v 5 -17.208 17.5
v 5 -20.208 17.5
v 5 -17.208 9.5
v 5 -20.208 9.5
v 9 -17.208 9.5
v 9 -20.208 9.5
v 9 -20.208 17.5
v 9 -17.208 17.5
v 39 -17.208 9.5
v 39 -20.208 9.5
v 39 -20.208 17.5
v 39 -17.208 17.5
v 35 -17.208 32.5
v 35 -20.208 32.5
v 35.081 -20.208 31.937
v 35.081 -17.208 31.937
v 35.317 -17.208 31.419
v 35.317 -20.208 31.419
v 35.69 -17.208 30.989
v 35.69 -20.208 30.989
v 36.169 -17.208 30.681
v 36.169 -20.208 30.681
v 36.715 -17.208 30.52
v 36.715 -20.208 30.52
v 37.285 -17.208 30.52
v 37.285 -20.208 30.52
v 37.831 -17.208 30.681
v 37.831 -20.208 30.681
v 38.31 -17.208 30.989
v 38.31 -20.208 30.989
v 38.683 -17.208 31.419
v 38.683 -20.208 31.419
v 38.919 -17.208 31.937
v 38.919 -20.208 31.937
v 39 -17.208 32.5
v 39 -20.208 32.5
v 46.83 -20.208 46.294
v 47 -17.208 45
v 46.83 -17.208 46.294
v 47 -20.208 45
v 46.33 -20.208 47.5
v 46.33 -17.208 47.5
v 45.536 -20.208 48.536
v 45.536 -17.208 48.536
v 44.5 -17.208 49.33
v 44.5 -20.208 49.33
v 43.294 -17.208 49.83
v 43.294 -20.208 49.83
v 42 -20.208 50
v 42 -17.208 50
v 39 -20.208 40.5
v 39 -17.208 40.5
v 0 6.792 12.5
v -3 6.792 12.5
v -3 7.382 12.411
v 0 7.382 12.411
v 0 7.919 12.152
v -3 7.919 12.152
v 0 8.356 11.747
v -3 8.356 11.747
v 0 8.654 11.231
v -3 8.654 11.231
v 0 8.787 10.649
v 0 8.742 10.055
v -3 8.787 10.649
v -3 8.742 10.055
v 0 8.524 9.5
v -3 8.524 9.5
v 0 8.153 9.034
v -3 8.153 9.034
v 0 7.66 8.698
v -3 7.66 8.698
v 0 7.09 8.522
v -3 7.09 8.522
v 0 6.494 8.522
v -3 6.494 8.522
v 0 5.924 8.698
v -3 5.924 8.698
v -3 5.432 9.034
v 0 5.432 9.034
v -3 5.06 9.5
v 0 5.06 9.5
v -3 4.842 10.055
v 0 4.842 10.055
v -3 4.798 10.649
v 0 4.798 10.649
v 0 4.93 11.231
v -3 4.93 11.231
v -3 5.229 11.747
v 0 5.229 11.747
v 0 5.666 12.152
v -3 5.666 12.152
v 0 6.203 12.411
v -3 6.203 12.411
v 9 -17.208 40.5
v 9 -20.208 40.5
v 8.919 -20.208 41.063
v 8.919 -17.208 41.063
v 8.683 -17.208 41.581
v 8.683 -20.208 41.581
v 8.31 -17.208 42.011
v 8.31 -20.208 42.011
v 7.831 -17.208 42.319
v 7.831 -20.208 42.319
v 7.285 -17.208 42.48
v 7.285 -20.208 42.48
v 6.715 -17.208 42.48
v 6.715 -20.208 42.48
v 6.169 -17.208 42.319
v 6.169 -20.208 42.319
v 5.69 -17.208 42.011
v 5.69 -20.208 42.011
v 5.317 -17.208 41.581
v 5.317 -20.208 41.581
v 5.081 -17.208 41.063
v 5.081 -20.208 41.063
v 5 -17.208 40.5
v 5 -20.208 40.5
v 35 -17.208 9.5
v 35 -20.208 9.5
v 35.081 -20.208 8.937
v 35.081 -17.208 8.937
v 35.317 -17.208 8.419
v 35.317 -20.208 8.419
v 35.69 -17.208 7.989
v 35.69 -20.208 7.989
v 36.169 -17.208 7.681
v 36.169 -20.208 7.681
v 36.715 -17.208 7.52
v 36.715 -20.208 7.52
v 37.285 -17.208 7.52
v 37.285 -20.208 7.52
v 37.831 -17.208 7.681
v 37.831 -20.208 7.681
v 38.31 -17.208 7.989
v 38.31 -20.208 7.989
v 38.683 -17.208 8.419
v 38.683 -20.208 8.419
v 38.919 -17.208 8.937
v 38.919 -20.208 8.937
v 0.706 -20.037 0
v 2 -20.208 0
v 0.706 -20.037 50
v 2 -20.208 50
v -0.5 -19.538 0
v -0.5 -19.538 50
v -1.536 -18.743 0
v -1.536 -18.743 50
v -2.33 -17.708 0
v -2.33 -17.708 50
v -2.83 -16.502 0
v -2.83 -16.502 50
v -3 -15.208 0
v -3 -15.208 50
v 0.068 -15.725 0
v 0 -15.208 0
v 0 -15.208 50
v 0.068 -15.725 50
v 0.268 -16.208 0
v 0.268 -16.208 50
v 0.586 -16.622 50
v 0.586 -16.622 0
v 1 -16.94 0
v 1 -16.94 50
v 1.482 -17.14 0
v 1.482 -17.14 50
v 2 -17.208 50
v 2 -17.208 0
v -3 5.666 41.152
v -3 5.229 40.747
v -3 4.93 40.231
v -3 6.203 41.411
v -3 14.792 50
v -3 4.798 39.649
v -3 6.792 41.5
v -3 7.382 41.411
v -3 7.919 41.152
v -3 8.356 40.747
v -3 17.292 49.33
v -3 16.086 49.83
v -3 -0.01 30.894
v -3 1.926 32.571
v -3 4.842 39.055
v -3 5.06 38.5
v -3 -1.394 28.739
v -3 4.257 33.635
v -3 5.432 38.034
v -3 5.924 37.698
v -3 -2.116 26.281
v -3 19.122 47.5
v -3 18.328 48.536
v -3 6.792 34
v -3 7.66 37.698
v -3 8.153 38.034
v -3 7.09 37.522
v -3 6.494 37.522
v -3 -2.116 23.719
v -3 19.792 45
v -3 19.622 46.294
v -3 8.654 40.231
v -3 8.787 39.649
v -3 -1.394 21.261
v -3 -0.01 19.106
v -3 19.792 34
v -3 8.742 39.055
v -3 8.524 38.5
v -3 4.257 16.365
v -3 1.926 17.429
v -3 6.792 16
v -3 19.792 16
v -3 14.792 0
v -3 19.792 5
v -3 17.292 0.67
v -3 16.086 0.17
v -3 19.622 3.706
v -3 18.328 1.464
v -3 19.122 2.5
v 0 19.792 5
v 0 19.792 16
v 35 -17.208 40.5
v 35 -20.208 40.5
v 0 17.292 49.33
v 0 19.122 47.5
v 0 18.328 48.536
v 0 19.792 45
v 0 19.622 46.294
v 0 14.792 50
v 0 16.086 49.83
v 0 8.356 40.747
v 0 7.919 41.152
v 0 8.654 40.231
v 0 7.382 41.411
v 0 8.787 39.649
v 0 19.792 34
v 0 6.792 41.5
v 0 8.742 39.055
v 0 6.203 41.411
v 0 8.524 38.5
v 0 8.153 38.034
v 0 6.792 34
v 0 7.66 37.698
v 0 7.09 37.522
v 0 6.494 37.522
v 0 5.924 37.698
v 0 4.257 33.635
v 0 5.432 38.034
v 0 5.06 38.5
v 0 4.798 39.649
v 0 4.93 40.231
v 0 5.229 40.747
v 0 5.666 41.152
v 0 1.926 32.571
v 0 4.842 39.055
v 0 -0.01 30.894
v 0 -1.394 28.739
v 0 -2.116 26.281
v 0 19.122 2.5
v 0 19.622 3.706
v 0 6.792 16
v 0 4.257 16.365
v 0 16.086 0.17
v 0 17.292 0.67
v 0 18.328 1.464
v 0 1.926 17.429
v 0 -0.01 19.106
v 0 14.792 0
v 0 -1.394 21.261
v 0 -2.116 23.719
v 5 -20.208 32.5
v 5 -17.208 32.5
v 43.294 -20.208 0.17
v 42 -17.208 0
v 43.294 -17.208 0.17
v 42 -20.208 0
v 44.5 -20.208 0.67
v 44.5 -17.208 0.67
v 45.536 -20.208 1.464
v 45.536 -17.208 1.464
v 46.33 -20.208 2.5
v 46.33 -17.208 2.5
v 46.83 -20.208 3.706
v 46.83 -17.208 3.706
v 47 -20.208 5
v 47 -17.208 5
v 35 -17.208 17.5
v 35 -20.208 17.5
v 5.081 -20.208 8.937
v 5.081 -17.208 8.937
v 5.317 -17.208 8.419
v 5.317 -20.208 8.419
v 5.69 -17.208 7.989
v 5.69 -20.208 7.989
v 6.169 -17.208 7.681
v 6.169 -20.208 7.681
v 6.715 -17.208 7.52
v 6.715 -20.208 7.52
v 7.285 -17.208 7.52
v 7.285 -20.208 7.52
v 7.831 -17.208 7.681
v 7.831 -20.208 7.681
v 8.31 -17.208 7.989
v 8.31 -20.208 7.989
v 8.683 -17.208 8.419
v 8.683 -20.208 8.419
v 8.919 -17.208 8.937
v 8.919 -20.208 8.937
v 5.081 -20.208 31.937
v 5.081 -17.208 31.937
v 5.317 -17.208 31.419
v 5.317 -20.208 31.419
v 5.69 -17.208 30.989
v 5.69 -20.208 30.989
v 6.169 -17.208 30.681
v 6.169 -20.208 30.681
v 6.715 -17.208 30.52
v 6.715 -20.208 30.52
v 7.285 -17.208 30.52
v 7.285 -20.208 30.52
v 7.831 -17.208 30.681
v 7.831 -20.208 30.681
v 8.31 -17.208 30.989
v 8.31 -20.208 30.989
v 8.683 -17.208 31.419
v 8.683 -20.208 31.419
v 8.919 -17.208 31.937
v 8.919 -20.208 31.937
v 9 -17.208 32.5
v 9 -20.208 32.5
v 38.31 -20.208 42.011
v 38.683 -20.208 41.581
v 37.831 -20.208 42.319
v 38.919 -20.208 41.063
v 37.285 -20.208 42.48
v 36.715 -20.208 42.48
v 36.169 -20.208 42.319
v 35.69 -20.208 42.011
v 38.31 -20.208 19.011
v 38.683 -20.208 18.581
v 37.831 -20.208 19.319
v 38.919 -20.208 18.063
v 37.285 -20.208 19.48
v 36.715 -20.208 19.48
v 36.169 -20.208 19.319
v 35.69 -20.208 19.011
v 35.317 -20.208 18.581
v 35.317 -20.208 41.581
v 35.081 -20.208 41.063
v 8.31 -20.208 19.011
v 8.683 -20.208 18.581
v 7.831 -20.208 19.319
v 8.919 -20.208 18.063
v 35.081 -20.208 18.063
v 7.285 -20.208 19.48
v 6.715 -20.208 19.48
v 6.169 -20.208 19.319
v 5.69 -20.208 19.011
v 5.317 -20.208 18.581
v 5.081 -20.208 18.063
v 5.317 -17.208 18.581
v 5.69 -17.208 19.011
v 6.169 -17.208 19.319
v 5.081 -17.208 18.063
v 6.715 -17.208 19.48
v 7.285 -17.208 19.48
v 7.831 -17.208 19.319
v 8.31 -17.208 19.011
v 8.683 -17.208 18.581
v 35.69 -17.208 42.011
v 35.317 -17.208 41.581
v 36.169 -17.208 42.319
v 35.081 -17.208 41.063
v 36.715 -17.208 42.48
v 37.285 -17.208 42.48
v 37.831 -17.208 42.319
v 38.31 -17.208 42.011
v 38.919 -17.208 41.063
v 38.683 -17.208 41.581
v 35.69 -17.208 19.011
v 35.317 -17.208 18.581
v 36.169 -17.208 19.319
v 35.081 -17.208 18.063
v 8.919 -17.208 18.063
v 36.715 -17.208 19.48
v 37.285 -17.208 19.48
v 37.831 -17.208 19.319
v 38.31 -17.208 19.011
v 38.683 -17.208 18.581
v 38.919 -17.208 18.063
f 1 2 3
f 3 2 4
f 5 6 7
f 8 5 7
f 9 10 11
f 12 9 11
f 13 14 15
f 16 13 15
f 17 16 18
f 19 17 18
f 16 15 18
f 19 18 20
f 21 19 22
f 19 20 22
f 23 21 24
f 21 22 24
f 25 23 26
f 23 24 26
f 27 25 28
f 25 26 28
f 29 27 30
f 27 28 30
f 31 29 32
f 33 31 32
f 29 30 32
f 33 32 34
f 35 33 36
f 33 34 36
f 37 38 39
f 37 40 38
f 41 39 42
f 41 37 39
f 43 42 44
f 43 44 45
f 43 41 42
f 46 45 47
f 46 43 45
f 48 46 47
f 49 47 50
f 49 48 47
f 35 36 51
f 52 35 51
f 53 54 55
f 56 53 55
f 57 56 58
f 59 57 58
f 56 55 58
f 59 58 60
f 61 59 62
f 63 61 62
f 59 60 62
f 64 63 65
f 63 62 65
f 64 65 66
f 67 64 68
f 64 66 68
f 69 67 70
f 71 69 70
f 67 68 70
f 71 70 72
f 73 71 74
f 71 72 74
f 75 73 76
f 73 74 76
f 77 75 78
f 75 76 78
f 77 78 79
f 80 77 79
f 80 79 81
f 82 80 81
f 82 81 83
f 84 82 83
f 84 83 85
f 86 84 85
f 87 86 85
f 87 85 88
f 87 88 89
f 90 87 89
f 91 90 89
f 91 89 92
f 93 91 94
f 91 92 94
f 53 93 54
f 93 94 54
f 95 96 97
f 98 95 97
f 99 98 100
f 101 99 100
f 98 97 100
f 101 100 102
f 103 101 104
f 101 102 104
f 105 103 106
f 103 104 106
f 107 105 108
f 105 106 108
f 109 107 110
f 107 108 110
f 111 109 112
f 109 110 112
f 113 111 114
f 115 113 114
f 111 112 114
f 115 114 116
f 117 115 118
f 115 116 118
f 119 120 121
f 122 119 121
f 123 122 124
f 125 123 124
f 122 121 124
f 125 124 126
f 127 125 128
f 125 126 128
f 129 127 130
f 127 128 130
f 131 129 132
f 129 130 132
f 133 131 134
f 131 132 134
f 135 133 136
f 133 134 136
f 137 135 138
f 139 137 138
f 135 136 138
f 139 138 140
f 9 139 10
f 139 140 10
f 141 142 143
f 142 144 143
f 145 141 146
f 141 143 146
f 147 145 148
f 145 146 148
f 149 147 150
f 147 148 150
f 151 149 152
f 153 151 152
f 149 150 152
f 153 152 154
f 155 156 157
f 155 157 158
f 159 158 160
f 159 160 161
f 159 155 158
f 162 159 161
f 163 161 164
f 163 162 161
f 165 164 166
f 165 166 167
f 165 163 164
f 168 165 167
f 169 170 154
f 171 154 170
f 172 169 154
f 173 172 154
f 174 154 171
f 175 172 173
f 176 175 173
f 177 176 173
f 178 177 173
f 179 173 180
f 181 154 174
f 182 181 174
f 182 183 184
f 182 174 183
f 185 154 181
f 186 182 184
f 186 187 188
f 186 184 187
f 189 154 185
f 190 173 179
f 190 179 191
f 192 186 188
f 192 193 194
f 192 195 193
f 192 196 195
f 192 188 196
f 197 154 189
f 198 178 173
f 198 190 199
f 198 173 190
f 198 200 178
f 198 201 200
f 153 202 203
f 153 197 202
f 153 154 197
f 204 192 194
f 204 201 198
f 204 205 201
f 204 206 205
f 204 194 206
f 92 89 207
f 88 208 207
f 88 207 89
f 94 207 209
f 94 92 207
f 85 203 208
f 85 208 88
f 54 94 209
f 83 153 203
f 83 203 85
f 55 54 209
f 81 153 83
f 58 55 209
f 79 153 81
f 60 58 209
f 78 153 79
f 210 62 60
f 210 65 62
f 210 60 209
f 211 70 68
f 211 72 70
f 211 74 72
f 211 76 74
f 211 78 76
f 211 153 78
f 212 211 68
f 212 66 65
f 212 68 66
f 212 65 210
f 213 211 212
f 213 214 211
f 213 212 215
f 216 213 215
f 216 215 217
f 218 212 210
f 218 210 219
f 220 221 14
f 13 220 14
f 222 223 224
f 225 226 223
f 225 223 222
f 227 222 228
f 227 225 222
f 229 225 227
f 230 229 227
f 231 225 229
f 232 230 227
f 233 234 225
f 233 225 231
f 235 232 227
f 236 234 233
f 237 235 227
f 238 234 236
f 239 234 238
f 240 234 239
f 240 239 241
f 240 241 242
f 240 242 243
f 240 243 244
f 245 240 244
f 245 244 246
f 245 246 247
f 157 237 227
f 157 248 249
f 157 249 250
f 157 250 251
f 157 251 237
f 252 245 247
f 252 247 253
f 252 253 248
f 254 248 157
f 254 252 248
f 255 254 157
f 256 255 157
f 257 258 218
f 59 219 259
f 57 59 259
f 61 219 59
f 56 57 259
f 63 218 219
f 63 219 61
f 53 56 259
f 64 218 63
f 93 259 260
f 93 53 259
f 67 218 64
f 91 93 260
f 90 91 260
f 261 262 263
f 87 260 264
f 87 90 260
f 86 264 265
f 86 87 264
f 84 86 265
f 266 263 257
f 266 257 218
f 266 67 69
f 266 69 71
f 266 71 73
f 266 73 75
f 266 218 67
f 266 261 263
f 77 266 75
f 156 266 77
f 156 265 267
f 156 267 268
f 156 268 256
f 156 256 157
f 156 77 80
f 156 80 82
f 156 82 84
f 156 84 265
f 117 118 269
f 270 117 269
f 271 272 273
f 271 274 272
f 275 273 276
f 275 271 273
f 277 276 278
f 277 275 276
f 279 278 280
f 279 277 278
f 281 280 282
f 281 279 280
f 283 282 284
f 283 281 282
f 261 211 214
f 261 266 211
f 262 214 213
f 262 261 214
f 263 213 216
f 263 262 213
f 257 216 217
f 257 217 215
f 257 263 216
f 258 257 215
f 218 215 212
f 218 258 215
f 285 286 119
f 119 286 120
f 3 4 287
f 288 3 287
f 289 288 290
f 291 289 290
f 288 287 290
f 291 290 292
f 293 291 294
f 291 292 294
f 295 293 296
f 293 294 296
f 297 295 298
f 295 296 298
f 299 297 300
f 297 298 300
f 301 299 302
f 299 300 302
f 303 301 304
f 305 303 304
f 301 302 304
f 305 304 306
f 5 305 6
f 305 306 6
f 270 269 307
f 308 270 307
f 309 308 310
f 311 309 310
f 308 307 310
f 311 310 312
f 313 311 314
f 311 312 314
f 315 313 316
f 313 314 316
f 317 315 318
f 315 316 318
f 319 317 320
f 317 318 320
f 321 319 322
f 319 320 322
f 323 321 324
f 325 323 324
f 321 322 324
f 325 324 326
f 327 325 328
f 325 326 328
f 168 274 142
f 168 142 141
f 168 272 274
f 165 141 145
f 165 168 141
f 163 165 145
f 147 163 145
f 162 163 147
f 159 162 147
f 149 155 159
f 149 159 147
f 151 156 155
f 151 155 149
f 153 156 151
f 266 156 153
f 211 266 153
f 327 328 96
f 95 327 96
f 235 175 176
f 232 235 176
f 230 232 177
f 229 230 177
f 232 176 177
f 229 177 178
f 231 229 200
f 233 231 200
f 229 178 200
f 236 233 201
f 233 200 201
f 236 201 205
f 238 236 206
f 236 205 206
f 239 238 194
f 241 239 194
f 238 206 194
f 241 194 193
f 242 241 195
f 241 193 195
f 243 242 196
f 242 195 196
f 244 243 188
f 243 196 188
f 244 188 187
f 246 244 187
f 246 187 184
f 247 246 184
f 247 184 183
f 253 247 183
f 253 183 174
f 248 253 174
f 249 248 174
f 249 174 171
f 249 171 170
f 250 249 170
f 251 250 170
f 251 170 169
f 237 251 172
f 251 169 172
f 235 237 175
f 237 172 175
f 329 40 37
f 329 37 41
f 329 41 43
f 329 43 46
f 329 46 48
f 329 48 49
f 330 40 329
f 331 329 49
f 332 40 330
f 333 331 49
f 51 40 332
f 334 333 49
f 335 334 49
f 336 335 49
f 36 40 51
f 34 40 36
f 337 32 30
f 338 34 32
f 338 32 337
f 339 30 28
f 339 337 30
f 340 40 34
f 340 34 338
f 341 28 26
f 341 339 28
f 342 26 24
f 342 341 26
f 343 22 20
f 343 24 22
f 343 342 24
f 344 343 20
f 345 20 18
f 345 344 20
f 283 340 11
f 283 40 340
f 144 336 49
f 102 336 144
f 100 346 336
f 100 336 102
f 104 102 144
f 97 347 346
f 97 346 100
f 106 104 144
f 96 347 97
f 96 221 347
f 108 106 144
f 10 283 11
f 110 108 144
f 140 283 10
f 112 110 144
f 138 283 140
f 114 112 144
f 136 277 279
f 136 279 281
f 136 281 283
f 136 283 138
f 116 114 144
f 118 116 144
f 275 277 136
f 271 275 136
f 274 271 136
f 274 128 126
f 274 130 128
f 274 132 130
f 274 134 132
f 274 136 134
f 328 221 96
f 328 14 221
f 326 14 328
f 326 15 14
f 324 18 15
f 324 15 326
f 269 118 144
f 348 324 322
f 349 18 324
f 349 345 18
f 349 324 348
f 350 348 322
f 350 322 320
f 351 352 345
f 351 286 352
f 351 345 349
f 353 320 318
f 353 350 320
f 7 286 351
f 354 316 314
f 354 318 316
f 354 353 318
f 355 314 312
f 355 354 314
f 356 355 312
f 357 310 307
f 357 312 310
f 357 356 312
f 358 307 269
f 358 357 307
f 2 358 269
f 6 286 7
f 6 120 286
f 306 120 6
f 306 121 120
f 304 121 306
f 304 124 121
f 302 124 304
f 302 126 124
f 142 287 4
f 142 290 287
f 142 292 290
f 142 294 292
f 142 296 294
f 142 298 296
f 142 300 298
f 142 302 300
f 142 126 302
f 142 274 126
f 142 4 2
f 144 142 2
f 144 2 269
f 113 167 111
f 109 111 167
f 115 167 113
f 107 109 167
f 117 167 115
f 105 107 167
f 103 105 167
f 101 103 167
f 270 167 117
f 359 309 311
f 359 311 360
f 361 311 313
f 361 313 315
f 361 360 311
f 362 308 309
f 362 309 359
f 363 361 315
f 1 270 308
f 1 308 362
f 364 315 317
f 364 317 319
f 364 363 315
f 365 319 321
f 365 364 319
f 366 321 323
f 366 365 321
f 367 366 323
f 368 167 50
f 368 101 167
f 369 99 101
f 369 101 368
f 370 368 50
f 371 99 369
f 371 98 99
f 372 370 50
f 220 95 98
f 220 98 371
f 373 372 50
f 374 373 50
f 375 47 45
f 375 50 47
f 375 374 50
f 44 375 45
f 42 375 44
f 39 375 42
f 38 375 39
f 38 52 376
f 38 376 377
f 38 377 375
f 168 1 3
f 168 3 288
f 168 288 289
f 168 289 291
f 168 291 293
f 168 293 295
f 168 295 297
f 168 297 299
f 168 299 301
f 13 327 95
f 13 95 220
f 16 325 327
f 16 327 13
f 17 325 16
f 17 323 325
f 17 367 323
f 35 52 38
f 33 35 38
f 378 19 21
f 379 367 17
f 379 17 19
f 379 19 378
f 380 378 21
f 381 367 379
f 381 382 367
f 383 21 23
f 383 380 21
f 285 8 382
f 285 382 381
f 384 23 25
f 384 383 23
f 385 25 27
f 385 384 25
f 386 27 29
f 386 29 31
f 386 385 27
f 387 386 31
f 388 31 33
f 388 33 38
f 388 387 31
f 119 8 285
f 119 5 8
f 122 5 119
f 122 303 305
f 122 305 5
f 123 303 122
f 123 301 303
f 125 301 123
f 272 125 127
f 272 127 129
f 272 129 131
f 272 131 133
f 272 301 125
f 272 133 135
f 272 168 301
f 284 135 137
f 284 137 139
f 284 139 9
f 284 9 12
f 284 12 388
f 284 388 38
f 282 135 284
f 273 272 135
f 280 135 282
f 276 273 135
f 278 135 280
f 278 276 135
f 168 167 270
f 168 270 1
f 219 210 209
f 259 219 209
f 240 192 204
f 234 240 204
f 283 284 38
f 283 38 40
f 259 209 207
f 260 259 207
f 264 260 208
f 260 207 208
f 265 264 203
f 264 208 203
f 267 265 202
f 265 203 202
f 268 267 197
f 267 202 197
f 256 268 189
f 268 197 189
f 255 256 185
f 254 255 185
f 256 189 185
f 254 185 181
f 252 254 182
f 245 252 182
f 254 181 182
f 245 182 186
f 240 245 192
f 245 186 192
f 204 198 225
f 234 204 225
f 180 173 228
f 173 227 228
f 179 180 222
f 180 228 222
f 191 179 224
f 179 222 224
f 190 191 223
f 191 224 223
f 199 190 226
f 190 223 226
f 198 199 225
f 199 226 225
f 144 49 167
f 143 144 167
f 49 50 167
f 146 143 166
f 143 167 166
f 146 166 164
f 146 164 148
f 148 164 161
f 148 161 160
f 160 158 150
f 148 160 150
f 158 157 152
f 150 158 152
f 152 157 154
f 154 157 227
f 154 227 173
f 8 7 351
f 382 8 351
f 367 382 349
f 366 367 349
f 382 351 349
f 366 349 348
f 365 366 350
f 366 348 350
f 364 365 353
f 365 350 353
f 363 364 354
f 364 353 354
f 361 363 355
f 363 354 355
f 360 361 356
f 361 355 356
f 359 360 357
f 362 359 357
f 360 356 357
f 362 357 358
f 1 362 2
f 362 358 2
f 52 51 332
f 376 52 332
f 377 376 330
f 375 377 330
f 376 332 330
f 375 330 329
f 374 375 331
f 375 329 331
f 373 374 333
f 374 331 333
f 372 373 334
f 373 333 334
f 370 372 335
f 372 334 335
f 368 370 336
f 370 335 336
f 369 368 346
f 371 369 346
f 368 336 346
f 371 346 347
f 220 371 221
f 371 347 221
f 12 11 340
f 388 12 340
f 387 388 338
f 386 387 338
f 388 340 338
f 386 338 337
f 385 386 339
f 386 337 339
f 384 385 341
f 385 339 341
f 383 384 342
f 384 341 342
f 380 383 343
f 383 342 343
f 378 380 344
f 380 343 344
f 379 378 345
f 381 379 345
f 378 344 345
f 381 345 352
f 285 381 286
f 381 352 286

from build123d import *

# Parameters (mm, degrees)
EXTRUDE_1_DEPTH     = 50
SKETCH_2_R          = 2
CUT_EXTRUDE_1_DEPTH = 3
CUT_EXTRUDE_2_DEPTH = 3
FILLET_1_R          = 5
FILLET_2_R          = 5


with BuildPart() as part:
    # 草图1 → 凸台-拉伸1 (new body)
    with BuildSketch(Plane.XY):
        with BuildLine():
            Line((0, 19.792207792), (0, -15.207792208))
            ThreePointArc((0, -15.207792208), (0.585786438, -16.62200577), (2, -17.207792208))
            Line((2, -17.207792208), (47, -17.207792208))
            Line((47, -17.207792208), (47, -20.207792208))
            Line((47, -20.207792208), (-3, -20.207792208))
            Line((-3, -20.207792208), (-3, 19.792207792))
            Line((-3, 19.792207792), (0, 19.792207792))
        make_face()
    extrude(amount=EXTRUDE_1_DEPTH)

    # 草图2 → 切除-拉伸1 (cut)
    with BuildSketch(Plane.ZY.offset(3)):
        with Locations((10.5, 6.792207792)):
            Circle(SKETCH_2_R)
        with BuildLine():
            Line((34, 19.792207792), (16, 19.792207792))
            Line((16, 19.792207792), (16, 6.792207792))
            ThreePointArc((16, 6.792207792), (25, -2.207792208), (34, 6.792207792))
            Line((34, 6.792207792), (34, 19.792207792))
        make_face()
        with Locations((39.5, 6.792207792)):
            Circle(SKETCH_2_R)
    extrude(amount=-CUT_EXTRUDE_1_DEPTH, mode=Mode.SUBTRACT)

    # 草图3 → 切除-拉伸2 (cut)
    with BuildSketch(Plane.XZ.offset(20.207792208)):
        with BuildLine():
            Line((39, 32.5), (39, 40.5))
            ThreePointArc((39, 40.5), (37, 42.5), (35, 40.5))
            Line((35, 40.5), (35, 32.5))
            ThreePointArc((35, 32.5), (37, 30.5), (39, 32.5))
        make_face()
        with BuildLine():
            Line((35, 17.5), (35, 9.5))
            ThreePointArc((35, 9.5), (37, 7.5), (39, 9.5))
            Line((39, 9.5), (39, 17.5))
            ThreePointArc((39, 17.5), (37, 19.5), (35, 17.5))
        make_face()
        with BuildLine():
            Line((5, 17.5), (5, 9.5))
            ThreePointArc((5, 9.5), (7, 7.5), (9, 9.5))
            Line((9, 9.5), (9, 17.5))
            ThreePointArc((9, 17.5), (7, 19.5), (5, 17.5))
        make_face()
        with BuildLine():
            Line((9, 32.5), (9, 40.5))
            ThreePointArc((9, 40.5), (7, 42.5), (5, 40.5))
            Line((5, 40.5), (5, 32.5))
            ThreePointArc((5, 32.5), (7, 30.5), (9, 32.5))
        make_face()
    extrude(amount=-CUT_EXTRUDE_2_DEPTH, mode=Mode.SUBTRACT)

    # 圆角1
    fillet_1_edges = [part.edges().sort_by_distance(p)[0] for p in [
        (-3, -20.207792208, 25),
    ]]
    fillet(fillet_1_edges, radius=FILLET_1_R)

    # 圆角2
    fillet_2_edges = [part.edges().sort_by_distance(p)[0] for p in [
        (47, -18.707792208, 50),
        (-1.5, 19.792207792, 50),
        (47, -18.707792208, 0),
        (-1.5, 19.792207792, 0),
    ]]
    fillet(fillet_2_edges, radius=FILLET_2_R)


solid = part.part
